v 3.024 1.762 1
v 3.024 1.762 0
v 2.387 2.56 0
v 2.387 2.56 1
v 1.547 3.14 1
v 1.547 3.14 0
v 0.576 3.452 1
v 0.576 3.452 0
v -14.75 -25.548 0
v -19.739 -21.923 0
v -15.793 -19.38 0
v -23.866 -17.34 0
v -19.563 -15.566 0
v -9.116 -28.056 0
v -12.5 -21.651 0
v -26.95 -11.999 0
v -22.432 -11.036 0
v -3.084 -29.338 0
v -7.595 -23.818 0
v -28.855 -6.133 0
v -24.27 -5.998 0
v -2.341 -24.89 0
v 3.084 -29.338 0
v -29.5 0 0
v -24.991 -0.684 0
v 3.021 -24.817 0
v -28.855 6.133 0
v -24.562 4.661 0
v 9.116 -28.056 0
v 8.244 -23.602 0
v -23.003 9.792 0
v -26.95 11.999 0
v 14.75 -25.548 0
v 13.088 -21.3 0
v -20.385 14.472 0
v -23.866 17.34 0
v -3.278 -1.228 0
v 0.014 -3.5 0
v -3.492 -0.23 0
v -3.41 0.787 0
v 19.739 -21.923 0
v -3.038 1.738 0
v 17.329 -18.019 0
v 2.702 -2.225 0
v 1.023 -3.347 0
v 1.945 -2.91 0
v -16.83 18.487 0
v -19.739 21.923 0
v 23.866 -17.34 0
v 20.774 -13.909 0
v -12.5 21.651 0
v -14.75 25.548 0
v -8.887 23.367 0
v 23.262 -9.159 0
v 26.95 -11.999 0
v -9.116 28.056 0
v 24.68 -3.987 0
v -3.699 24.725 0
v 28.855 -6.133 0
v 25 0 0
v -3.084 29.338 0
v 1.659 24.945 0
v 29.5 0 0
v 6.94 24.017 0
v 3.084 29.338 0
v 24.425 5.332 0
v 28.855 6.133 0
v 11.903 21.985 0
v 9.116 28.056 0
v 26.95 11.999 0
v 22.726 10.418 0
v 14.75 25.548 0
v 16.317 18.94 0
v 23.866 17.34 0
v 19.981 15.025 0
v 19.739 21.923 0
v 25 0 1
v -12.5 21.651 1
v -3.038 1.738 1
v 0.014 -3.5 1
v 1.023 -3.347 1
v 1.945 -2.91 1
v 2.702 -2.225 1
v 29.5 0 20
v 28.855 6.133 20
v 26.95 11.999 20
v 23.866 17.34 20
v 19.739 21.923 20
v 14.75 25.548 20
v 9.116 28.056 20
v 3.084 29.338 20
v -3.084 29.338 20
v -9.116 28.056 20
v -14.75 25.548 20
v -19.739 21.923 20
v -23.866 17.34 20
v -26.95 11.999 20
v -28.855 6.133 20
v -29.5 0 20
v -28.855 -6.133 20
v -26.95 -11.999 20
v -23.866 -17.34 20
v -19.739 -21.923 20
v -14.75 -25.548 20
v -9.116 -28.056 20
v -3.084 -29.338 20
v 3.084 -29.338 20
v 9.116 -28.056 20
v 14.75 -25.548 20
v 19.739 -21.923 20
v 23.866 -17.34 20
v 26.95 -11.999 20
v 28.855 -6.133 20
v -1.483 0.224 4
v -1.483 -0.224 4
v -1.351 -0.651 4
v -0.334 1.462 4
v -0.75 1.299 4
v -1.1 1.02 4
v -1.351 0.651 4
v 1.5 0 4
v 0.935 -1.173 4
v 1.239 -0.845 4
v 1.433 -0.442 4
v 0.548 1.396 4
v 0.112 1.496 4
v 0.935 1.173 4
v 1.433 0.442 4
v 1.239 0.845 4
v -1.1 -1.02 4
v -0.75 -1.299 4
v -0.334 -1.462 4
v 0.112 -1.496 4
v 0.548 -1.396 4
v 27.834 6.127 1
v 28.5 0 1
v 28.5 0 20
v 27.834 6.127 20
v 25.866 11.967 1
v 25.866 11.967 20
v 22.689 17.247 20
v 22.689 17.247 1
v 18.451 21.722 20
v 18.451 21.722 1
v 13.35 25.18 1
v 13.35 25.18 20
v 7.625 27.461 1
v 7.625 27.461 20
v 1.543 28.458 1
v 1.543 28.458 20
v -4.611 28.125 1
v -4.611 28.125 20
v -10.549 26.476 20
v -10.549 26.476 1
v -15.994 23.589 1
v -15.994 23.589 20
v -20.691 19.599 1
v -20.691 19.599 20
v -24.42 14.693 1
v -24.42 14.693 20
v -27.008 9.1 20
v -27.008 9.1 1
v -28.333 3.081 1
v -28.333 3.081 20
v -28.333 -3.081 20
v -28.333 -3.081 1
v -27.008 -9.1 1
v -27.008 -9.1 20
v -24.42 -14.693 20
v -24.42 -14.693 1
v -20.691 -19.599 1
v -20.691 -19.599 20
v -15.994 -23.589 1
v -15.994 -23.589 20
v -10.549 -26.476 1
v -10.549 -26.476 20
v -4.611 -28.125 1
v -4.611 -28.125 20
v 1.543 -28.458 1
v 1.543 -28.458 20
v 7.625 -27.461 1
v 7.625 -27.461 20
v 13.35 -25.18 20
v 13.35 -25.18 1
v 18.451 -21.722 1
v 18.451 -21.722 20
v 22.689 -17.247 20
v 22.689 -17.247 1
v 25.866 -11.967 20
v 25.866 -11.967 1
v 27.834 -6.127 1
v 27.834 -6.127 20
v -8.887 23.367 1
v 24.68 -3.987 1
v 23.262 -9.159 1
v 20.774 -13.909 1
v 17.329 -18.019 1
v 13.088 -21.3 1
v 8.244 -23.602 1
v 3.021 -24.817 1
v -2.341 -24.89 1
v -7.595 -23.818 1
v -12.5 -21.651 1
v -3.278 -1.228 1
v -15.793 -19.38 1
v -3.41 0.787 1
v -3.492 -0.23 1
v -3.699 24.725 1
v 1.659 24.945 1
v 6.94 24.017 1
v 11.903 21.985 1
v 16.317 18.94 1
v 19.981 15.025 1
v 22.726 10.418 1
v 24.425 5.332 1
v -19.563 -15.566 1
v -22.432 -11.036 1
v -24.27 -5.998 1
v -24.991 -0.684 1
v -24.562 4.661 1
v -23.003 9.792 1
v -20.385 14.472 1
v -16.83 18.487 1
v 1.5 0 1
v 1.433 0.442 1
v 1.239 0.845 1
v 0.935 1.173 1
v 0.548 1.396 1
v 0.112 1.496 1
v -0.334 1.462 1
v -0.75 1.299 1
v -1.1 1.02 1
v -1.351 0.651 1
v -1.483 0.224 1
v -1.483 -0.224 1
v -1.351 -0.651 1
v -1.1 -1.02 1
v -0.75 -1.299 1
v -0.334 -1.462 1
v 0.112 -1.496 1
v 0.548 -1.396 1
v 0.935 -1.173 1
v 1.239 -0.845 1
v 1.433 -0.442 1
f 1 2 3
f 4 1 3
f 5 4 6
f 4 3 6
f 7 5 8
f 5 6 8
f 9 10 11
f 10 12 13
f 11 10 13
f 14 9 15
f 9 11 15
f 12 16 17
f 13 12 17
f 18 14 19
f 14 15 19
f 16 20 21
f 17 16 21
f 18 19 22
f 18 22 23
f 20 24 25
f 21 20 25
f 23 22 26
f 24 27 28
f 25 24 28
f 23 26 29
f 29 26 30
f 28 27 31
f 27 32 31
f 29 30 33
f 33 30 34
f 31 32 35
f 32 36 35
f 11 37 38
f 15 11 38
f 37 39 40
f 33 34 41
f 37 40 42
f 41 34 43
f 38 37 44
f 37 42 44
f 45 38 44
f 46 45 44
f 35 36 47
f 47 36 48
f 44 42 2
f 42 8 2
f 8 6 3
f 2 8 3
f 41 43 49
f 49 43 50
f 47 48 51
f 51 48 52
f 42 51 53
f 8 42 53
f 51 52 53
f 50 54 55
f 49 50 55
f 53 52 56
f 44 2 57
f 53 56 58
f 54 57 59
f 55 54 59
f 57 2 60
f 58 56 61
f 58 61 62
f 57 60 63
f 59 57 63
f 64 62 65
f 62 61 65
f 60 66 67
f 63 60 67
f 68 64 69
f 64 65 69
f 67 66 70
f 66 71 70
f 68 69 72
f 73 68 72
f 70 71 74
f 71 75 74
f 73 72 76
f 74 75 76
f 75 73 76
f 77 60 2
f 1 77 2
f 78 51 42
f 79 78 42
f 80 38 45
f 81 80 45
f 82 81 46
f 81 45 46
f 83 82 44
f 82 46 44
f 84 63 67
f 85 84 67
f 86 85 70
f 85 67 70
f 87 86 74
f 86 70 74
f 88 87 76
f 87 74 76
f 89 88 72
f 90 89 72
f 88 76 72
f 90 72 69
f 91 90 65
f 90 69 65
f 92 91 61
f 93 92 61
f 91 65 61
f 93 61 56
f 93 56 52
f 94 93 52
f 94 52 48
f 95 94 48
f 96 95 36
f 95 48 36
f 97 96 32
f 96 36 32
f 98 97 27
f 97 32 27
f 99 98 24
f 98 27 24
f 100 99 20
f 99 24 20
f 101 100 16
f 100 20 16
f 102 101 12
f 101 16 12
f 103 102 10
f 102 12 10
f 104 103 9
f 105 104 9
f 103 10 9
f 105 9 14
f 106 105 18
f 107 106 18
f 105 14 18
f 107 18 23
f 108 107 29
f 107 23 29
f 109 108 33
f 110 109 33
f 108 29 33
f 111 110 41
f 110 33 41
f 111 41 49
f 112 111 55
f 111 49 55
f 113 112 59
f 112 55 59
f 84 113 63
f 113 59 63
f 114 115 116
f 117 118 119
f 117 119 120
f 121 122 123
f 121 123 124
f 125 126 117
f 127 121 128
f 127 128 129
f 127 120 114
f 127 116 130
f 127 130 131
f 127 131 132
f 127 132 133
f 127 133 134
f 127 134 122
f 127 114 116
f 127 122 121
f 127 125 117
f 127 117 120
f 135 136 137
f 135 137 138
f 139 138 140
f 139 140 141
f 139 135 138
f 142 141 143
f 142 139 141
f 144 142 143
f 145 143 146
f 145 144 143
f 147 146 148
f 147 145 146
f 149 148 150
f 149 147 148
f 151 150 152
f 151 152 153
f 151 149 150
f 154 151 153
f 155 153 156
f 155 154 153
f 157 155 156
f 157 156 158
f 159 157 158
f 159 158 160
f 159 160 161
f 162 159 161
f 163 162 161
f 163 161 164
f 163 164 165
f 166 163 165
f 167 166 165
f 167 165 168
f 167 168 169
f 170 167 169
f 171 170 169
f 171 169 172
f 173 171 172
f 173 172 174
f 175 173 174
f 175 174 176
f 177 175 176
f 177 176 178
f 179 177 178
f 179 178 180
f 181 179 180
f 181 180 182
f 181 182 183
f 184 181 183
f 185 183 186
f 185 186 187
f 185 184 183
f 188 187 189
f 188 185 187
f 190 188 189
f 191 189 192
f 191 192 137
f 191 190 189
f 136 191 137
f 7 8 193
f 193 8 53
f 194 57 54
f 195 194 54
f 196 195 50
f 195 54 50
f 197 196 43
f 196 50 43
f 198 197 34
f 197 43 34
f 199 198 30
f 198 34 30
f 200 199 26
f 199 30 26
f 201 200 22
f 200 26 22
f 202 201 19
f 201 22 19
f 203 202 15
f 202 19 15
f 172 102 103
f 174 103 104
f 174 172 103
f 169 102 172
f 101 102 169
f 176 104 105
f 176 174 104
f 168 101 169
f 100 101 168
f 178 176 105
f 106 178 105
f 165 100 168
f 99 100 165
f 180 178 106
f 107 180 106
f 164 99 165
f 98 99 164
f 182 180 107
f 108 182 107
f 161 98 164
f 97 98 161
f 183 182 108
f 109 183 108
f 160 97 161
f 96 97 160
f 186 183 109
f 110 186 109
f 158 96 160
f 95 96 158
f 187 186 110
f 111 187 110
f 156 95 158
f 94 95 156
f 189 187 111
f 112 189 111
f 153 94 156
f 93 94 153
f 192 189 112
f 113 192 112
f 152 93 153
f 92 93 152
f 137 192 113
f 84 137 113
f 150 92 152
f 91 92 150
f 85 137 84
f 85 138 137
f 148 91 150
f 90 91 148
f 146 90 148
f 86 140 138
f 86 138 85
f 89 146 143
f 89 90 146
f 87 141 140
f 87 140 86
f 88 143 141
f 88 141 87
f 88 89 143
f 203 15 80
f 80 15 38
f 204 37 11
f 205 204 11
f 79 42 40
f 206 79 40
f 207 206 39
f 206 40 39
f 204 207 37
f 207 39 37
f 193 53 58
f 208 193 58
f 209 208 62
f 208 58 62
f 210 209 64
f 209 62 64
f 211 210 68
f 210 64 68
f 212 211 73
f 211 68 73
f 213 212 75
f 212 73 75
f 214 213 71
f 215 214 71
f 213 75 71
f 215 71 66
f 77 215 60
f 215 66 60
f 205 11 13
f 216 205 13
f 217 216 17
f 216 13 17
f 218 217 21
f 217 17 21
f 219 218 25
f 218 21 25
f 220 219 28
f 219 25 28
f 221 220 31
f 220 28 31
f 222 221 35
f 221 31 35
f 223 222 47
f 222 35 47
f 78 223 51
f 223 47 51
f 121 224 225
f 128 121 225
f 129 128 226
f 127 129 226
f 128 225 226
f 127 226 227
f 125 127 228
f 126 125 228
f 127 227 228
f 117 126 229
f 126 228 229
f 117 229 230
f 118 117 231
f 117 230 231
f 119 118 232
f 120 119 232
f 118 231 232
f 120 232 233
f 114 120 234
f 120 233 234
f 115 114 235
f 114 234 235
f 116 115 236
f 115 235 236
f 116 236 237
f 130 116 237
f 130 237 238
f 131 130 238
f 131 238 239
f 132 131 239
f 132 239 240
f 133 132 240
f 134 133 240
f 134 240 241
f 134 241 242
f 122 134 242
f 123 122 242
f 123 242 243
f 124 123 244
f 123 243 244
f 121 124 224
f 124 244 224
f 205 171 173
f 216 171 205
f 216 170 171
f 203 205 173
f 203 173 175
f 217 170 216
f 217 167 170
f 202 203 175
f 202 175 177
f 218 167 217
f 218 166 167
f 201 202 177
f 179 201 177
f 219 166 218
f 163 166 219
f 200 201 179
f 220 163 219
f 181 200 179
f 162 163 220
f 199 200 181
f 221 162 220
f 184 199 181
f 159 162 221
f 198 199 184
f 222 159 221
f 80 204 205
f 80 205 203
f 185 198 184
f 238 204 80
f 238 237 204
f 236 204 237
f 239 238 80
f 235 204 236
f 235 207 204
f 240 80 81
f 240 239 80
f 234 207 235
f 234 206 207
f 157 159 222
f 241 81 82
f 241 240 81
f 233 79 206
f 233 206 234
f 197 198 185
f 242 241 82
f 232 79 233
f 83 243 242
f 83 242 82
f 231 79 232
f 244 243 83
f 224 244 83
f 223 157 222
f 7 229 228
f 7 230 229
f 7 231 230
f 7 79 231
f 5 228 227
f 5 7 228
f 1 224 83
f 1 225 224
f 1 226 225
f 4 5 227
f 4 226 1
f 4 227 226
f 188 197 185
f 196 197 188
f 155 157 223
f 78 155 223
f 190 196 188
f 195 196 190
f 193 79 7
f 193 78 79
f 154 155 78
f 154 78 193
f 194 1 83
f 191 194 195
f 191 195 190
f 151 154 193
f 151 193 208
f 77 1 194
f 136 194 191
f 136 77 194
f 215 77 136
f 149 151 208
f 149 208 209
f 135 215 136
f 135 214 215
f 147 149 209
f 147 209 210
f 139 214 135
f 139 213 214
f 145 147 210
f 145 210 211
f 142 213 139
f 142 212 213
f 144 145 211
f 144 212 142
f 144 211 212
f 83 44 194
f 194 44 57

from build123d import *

# Parameters (mm, degrees)
F0_R     = 29.5
F0_R_2   = 28.5
F1_DEPTH = 20
F2_DEPTH = 1
F3_R     = 1.5
F4_DEPTH = 3


with BuildPart() as f1:
    # F0 (on Top) → F1 (new body)
    with BuildSketch(Plane.XY):
        Circle(F0_R)
        Circle(F0_R_2, mode=Mode.SUBTRACT)
    extrude(amount=F1_DEPTH)

    # F0 (on Top) → F2 (join)
    with BuildSketch(Plane.XY):
        Circle(F0_R_2)
        with BuildLine():
            ThreePointArc((-8.887001, 23.367097), (14.191987, 20.581242), (25, 0))
            ThreePointArc((25, 0), (24.919872, -2), (24.68, -3.987179))
            ThreePointArc((24.68, -3.987179), (10.727885, -22.581242), (-12.5, -21.650635))
            ThreePointArc((-12.5, -21.650635), (-14.191987, -20.581242), (-15.792999, -19.379917))
            ThreePointArc((-15.792999, -19.379917), (-24.919872, 2), (-12.5, 21.650635))
            ThreePointArc((-12.5, 21.650635), (-10.727885, 22.581242), (-8.887001, 23.367097))
        make_face(mode=Mode.SUBTRACT)
        with BuildLine():
            Line((0.575662, 3.452335), (-8.887001, 23.367097))
            ThreePointArc((-8.887001, 23.367097), (-10.727885, 22.581242), (-12.5, 21.650635))
            Line((-12.5, 21.650635), (-3.038183, 1.737654))
            ThreePointArc((-3.038183, 1.737654), (-1.500345, 3.162114), (0.575662, 3.452335))
        make_face()
        with BuildLine():
            ThreePointArc((-15.792999, -19.379917), (-14.191987, -20.581242), (-12.5, -21.650635))
            Line((-12.5, -21.650635), (0.014239, -3.499971))
            ThreePointArc((0.014239, -3.499971), (-1.988299, -2.880394), (-3.27764, -1.22763))
            Line((-3.27764, -1.22763), (-15.792999, -19.379917))
        make_face()
        with BuildLine():
            ThreePointArc((3.5, 0), (3.378891, 0.912742), (3.023944, 1.762317))
            ThreePointArc((3.023944, 1.762317), (1.988299, 2.880394), (0.575662, 3.452335))
            ThreePointArc((0.575662, 3.452335), (-1.500345, 3.162114), (-3.038183, 1.737654))
            ThreePointArc((-3.038183, 1.737654), (-3.488644, 0.28172), (-3.27764, -1.22763))
            ThreePointArc((-3.27764, -1.22763), (-1.988299, -2.880394), (0.014239, -3.499971))
            ThreePointArc((0.014239, -3.499971), (1.500345, -3.162114), (2.701978, -2.224705))
            ThreePointArc((2.701978, -2.224705), (3.294459, -1.181752), (3.5, 0))
        make_face()
        with BuildLine():
            ThreePointArc((24.68, -3.987179), (24.919872, -2), (25, 0))
            Line((25, 0), (3.023944, 1.762317))
            ThreePointArc((3.023944, 1.762317), (3.378891, 0.912742), (3.5, 0))
            ThreePointArc((3.5, 0), (3.294459, -1.181752), (2.701978, -2.224705))
            Line((2.701978, -2.224705), (24.68, -3.987179))
        make_face()
    extrude(amount=F2_DEPTH)

    # F3 (on face) → F4 (join)
    with BuildSketch(Plane.XY.offset(1)):
        Circle(F3_R)
    extrude(amount=F4_DEPTH)


solid = f1.part
